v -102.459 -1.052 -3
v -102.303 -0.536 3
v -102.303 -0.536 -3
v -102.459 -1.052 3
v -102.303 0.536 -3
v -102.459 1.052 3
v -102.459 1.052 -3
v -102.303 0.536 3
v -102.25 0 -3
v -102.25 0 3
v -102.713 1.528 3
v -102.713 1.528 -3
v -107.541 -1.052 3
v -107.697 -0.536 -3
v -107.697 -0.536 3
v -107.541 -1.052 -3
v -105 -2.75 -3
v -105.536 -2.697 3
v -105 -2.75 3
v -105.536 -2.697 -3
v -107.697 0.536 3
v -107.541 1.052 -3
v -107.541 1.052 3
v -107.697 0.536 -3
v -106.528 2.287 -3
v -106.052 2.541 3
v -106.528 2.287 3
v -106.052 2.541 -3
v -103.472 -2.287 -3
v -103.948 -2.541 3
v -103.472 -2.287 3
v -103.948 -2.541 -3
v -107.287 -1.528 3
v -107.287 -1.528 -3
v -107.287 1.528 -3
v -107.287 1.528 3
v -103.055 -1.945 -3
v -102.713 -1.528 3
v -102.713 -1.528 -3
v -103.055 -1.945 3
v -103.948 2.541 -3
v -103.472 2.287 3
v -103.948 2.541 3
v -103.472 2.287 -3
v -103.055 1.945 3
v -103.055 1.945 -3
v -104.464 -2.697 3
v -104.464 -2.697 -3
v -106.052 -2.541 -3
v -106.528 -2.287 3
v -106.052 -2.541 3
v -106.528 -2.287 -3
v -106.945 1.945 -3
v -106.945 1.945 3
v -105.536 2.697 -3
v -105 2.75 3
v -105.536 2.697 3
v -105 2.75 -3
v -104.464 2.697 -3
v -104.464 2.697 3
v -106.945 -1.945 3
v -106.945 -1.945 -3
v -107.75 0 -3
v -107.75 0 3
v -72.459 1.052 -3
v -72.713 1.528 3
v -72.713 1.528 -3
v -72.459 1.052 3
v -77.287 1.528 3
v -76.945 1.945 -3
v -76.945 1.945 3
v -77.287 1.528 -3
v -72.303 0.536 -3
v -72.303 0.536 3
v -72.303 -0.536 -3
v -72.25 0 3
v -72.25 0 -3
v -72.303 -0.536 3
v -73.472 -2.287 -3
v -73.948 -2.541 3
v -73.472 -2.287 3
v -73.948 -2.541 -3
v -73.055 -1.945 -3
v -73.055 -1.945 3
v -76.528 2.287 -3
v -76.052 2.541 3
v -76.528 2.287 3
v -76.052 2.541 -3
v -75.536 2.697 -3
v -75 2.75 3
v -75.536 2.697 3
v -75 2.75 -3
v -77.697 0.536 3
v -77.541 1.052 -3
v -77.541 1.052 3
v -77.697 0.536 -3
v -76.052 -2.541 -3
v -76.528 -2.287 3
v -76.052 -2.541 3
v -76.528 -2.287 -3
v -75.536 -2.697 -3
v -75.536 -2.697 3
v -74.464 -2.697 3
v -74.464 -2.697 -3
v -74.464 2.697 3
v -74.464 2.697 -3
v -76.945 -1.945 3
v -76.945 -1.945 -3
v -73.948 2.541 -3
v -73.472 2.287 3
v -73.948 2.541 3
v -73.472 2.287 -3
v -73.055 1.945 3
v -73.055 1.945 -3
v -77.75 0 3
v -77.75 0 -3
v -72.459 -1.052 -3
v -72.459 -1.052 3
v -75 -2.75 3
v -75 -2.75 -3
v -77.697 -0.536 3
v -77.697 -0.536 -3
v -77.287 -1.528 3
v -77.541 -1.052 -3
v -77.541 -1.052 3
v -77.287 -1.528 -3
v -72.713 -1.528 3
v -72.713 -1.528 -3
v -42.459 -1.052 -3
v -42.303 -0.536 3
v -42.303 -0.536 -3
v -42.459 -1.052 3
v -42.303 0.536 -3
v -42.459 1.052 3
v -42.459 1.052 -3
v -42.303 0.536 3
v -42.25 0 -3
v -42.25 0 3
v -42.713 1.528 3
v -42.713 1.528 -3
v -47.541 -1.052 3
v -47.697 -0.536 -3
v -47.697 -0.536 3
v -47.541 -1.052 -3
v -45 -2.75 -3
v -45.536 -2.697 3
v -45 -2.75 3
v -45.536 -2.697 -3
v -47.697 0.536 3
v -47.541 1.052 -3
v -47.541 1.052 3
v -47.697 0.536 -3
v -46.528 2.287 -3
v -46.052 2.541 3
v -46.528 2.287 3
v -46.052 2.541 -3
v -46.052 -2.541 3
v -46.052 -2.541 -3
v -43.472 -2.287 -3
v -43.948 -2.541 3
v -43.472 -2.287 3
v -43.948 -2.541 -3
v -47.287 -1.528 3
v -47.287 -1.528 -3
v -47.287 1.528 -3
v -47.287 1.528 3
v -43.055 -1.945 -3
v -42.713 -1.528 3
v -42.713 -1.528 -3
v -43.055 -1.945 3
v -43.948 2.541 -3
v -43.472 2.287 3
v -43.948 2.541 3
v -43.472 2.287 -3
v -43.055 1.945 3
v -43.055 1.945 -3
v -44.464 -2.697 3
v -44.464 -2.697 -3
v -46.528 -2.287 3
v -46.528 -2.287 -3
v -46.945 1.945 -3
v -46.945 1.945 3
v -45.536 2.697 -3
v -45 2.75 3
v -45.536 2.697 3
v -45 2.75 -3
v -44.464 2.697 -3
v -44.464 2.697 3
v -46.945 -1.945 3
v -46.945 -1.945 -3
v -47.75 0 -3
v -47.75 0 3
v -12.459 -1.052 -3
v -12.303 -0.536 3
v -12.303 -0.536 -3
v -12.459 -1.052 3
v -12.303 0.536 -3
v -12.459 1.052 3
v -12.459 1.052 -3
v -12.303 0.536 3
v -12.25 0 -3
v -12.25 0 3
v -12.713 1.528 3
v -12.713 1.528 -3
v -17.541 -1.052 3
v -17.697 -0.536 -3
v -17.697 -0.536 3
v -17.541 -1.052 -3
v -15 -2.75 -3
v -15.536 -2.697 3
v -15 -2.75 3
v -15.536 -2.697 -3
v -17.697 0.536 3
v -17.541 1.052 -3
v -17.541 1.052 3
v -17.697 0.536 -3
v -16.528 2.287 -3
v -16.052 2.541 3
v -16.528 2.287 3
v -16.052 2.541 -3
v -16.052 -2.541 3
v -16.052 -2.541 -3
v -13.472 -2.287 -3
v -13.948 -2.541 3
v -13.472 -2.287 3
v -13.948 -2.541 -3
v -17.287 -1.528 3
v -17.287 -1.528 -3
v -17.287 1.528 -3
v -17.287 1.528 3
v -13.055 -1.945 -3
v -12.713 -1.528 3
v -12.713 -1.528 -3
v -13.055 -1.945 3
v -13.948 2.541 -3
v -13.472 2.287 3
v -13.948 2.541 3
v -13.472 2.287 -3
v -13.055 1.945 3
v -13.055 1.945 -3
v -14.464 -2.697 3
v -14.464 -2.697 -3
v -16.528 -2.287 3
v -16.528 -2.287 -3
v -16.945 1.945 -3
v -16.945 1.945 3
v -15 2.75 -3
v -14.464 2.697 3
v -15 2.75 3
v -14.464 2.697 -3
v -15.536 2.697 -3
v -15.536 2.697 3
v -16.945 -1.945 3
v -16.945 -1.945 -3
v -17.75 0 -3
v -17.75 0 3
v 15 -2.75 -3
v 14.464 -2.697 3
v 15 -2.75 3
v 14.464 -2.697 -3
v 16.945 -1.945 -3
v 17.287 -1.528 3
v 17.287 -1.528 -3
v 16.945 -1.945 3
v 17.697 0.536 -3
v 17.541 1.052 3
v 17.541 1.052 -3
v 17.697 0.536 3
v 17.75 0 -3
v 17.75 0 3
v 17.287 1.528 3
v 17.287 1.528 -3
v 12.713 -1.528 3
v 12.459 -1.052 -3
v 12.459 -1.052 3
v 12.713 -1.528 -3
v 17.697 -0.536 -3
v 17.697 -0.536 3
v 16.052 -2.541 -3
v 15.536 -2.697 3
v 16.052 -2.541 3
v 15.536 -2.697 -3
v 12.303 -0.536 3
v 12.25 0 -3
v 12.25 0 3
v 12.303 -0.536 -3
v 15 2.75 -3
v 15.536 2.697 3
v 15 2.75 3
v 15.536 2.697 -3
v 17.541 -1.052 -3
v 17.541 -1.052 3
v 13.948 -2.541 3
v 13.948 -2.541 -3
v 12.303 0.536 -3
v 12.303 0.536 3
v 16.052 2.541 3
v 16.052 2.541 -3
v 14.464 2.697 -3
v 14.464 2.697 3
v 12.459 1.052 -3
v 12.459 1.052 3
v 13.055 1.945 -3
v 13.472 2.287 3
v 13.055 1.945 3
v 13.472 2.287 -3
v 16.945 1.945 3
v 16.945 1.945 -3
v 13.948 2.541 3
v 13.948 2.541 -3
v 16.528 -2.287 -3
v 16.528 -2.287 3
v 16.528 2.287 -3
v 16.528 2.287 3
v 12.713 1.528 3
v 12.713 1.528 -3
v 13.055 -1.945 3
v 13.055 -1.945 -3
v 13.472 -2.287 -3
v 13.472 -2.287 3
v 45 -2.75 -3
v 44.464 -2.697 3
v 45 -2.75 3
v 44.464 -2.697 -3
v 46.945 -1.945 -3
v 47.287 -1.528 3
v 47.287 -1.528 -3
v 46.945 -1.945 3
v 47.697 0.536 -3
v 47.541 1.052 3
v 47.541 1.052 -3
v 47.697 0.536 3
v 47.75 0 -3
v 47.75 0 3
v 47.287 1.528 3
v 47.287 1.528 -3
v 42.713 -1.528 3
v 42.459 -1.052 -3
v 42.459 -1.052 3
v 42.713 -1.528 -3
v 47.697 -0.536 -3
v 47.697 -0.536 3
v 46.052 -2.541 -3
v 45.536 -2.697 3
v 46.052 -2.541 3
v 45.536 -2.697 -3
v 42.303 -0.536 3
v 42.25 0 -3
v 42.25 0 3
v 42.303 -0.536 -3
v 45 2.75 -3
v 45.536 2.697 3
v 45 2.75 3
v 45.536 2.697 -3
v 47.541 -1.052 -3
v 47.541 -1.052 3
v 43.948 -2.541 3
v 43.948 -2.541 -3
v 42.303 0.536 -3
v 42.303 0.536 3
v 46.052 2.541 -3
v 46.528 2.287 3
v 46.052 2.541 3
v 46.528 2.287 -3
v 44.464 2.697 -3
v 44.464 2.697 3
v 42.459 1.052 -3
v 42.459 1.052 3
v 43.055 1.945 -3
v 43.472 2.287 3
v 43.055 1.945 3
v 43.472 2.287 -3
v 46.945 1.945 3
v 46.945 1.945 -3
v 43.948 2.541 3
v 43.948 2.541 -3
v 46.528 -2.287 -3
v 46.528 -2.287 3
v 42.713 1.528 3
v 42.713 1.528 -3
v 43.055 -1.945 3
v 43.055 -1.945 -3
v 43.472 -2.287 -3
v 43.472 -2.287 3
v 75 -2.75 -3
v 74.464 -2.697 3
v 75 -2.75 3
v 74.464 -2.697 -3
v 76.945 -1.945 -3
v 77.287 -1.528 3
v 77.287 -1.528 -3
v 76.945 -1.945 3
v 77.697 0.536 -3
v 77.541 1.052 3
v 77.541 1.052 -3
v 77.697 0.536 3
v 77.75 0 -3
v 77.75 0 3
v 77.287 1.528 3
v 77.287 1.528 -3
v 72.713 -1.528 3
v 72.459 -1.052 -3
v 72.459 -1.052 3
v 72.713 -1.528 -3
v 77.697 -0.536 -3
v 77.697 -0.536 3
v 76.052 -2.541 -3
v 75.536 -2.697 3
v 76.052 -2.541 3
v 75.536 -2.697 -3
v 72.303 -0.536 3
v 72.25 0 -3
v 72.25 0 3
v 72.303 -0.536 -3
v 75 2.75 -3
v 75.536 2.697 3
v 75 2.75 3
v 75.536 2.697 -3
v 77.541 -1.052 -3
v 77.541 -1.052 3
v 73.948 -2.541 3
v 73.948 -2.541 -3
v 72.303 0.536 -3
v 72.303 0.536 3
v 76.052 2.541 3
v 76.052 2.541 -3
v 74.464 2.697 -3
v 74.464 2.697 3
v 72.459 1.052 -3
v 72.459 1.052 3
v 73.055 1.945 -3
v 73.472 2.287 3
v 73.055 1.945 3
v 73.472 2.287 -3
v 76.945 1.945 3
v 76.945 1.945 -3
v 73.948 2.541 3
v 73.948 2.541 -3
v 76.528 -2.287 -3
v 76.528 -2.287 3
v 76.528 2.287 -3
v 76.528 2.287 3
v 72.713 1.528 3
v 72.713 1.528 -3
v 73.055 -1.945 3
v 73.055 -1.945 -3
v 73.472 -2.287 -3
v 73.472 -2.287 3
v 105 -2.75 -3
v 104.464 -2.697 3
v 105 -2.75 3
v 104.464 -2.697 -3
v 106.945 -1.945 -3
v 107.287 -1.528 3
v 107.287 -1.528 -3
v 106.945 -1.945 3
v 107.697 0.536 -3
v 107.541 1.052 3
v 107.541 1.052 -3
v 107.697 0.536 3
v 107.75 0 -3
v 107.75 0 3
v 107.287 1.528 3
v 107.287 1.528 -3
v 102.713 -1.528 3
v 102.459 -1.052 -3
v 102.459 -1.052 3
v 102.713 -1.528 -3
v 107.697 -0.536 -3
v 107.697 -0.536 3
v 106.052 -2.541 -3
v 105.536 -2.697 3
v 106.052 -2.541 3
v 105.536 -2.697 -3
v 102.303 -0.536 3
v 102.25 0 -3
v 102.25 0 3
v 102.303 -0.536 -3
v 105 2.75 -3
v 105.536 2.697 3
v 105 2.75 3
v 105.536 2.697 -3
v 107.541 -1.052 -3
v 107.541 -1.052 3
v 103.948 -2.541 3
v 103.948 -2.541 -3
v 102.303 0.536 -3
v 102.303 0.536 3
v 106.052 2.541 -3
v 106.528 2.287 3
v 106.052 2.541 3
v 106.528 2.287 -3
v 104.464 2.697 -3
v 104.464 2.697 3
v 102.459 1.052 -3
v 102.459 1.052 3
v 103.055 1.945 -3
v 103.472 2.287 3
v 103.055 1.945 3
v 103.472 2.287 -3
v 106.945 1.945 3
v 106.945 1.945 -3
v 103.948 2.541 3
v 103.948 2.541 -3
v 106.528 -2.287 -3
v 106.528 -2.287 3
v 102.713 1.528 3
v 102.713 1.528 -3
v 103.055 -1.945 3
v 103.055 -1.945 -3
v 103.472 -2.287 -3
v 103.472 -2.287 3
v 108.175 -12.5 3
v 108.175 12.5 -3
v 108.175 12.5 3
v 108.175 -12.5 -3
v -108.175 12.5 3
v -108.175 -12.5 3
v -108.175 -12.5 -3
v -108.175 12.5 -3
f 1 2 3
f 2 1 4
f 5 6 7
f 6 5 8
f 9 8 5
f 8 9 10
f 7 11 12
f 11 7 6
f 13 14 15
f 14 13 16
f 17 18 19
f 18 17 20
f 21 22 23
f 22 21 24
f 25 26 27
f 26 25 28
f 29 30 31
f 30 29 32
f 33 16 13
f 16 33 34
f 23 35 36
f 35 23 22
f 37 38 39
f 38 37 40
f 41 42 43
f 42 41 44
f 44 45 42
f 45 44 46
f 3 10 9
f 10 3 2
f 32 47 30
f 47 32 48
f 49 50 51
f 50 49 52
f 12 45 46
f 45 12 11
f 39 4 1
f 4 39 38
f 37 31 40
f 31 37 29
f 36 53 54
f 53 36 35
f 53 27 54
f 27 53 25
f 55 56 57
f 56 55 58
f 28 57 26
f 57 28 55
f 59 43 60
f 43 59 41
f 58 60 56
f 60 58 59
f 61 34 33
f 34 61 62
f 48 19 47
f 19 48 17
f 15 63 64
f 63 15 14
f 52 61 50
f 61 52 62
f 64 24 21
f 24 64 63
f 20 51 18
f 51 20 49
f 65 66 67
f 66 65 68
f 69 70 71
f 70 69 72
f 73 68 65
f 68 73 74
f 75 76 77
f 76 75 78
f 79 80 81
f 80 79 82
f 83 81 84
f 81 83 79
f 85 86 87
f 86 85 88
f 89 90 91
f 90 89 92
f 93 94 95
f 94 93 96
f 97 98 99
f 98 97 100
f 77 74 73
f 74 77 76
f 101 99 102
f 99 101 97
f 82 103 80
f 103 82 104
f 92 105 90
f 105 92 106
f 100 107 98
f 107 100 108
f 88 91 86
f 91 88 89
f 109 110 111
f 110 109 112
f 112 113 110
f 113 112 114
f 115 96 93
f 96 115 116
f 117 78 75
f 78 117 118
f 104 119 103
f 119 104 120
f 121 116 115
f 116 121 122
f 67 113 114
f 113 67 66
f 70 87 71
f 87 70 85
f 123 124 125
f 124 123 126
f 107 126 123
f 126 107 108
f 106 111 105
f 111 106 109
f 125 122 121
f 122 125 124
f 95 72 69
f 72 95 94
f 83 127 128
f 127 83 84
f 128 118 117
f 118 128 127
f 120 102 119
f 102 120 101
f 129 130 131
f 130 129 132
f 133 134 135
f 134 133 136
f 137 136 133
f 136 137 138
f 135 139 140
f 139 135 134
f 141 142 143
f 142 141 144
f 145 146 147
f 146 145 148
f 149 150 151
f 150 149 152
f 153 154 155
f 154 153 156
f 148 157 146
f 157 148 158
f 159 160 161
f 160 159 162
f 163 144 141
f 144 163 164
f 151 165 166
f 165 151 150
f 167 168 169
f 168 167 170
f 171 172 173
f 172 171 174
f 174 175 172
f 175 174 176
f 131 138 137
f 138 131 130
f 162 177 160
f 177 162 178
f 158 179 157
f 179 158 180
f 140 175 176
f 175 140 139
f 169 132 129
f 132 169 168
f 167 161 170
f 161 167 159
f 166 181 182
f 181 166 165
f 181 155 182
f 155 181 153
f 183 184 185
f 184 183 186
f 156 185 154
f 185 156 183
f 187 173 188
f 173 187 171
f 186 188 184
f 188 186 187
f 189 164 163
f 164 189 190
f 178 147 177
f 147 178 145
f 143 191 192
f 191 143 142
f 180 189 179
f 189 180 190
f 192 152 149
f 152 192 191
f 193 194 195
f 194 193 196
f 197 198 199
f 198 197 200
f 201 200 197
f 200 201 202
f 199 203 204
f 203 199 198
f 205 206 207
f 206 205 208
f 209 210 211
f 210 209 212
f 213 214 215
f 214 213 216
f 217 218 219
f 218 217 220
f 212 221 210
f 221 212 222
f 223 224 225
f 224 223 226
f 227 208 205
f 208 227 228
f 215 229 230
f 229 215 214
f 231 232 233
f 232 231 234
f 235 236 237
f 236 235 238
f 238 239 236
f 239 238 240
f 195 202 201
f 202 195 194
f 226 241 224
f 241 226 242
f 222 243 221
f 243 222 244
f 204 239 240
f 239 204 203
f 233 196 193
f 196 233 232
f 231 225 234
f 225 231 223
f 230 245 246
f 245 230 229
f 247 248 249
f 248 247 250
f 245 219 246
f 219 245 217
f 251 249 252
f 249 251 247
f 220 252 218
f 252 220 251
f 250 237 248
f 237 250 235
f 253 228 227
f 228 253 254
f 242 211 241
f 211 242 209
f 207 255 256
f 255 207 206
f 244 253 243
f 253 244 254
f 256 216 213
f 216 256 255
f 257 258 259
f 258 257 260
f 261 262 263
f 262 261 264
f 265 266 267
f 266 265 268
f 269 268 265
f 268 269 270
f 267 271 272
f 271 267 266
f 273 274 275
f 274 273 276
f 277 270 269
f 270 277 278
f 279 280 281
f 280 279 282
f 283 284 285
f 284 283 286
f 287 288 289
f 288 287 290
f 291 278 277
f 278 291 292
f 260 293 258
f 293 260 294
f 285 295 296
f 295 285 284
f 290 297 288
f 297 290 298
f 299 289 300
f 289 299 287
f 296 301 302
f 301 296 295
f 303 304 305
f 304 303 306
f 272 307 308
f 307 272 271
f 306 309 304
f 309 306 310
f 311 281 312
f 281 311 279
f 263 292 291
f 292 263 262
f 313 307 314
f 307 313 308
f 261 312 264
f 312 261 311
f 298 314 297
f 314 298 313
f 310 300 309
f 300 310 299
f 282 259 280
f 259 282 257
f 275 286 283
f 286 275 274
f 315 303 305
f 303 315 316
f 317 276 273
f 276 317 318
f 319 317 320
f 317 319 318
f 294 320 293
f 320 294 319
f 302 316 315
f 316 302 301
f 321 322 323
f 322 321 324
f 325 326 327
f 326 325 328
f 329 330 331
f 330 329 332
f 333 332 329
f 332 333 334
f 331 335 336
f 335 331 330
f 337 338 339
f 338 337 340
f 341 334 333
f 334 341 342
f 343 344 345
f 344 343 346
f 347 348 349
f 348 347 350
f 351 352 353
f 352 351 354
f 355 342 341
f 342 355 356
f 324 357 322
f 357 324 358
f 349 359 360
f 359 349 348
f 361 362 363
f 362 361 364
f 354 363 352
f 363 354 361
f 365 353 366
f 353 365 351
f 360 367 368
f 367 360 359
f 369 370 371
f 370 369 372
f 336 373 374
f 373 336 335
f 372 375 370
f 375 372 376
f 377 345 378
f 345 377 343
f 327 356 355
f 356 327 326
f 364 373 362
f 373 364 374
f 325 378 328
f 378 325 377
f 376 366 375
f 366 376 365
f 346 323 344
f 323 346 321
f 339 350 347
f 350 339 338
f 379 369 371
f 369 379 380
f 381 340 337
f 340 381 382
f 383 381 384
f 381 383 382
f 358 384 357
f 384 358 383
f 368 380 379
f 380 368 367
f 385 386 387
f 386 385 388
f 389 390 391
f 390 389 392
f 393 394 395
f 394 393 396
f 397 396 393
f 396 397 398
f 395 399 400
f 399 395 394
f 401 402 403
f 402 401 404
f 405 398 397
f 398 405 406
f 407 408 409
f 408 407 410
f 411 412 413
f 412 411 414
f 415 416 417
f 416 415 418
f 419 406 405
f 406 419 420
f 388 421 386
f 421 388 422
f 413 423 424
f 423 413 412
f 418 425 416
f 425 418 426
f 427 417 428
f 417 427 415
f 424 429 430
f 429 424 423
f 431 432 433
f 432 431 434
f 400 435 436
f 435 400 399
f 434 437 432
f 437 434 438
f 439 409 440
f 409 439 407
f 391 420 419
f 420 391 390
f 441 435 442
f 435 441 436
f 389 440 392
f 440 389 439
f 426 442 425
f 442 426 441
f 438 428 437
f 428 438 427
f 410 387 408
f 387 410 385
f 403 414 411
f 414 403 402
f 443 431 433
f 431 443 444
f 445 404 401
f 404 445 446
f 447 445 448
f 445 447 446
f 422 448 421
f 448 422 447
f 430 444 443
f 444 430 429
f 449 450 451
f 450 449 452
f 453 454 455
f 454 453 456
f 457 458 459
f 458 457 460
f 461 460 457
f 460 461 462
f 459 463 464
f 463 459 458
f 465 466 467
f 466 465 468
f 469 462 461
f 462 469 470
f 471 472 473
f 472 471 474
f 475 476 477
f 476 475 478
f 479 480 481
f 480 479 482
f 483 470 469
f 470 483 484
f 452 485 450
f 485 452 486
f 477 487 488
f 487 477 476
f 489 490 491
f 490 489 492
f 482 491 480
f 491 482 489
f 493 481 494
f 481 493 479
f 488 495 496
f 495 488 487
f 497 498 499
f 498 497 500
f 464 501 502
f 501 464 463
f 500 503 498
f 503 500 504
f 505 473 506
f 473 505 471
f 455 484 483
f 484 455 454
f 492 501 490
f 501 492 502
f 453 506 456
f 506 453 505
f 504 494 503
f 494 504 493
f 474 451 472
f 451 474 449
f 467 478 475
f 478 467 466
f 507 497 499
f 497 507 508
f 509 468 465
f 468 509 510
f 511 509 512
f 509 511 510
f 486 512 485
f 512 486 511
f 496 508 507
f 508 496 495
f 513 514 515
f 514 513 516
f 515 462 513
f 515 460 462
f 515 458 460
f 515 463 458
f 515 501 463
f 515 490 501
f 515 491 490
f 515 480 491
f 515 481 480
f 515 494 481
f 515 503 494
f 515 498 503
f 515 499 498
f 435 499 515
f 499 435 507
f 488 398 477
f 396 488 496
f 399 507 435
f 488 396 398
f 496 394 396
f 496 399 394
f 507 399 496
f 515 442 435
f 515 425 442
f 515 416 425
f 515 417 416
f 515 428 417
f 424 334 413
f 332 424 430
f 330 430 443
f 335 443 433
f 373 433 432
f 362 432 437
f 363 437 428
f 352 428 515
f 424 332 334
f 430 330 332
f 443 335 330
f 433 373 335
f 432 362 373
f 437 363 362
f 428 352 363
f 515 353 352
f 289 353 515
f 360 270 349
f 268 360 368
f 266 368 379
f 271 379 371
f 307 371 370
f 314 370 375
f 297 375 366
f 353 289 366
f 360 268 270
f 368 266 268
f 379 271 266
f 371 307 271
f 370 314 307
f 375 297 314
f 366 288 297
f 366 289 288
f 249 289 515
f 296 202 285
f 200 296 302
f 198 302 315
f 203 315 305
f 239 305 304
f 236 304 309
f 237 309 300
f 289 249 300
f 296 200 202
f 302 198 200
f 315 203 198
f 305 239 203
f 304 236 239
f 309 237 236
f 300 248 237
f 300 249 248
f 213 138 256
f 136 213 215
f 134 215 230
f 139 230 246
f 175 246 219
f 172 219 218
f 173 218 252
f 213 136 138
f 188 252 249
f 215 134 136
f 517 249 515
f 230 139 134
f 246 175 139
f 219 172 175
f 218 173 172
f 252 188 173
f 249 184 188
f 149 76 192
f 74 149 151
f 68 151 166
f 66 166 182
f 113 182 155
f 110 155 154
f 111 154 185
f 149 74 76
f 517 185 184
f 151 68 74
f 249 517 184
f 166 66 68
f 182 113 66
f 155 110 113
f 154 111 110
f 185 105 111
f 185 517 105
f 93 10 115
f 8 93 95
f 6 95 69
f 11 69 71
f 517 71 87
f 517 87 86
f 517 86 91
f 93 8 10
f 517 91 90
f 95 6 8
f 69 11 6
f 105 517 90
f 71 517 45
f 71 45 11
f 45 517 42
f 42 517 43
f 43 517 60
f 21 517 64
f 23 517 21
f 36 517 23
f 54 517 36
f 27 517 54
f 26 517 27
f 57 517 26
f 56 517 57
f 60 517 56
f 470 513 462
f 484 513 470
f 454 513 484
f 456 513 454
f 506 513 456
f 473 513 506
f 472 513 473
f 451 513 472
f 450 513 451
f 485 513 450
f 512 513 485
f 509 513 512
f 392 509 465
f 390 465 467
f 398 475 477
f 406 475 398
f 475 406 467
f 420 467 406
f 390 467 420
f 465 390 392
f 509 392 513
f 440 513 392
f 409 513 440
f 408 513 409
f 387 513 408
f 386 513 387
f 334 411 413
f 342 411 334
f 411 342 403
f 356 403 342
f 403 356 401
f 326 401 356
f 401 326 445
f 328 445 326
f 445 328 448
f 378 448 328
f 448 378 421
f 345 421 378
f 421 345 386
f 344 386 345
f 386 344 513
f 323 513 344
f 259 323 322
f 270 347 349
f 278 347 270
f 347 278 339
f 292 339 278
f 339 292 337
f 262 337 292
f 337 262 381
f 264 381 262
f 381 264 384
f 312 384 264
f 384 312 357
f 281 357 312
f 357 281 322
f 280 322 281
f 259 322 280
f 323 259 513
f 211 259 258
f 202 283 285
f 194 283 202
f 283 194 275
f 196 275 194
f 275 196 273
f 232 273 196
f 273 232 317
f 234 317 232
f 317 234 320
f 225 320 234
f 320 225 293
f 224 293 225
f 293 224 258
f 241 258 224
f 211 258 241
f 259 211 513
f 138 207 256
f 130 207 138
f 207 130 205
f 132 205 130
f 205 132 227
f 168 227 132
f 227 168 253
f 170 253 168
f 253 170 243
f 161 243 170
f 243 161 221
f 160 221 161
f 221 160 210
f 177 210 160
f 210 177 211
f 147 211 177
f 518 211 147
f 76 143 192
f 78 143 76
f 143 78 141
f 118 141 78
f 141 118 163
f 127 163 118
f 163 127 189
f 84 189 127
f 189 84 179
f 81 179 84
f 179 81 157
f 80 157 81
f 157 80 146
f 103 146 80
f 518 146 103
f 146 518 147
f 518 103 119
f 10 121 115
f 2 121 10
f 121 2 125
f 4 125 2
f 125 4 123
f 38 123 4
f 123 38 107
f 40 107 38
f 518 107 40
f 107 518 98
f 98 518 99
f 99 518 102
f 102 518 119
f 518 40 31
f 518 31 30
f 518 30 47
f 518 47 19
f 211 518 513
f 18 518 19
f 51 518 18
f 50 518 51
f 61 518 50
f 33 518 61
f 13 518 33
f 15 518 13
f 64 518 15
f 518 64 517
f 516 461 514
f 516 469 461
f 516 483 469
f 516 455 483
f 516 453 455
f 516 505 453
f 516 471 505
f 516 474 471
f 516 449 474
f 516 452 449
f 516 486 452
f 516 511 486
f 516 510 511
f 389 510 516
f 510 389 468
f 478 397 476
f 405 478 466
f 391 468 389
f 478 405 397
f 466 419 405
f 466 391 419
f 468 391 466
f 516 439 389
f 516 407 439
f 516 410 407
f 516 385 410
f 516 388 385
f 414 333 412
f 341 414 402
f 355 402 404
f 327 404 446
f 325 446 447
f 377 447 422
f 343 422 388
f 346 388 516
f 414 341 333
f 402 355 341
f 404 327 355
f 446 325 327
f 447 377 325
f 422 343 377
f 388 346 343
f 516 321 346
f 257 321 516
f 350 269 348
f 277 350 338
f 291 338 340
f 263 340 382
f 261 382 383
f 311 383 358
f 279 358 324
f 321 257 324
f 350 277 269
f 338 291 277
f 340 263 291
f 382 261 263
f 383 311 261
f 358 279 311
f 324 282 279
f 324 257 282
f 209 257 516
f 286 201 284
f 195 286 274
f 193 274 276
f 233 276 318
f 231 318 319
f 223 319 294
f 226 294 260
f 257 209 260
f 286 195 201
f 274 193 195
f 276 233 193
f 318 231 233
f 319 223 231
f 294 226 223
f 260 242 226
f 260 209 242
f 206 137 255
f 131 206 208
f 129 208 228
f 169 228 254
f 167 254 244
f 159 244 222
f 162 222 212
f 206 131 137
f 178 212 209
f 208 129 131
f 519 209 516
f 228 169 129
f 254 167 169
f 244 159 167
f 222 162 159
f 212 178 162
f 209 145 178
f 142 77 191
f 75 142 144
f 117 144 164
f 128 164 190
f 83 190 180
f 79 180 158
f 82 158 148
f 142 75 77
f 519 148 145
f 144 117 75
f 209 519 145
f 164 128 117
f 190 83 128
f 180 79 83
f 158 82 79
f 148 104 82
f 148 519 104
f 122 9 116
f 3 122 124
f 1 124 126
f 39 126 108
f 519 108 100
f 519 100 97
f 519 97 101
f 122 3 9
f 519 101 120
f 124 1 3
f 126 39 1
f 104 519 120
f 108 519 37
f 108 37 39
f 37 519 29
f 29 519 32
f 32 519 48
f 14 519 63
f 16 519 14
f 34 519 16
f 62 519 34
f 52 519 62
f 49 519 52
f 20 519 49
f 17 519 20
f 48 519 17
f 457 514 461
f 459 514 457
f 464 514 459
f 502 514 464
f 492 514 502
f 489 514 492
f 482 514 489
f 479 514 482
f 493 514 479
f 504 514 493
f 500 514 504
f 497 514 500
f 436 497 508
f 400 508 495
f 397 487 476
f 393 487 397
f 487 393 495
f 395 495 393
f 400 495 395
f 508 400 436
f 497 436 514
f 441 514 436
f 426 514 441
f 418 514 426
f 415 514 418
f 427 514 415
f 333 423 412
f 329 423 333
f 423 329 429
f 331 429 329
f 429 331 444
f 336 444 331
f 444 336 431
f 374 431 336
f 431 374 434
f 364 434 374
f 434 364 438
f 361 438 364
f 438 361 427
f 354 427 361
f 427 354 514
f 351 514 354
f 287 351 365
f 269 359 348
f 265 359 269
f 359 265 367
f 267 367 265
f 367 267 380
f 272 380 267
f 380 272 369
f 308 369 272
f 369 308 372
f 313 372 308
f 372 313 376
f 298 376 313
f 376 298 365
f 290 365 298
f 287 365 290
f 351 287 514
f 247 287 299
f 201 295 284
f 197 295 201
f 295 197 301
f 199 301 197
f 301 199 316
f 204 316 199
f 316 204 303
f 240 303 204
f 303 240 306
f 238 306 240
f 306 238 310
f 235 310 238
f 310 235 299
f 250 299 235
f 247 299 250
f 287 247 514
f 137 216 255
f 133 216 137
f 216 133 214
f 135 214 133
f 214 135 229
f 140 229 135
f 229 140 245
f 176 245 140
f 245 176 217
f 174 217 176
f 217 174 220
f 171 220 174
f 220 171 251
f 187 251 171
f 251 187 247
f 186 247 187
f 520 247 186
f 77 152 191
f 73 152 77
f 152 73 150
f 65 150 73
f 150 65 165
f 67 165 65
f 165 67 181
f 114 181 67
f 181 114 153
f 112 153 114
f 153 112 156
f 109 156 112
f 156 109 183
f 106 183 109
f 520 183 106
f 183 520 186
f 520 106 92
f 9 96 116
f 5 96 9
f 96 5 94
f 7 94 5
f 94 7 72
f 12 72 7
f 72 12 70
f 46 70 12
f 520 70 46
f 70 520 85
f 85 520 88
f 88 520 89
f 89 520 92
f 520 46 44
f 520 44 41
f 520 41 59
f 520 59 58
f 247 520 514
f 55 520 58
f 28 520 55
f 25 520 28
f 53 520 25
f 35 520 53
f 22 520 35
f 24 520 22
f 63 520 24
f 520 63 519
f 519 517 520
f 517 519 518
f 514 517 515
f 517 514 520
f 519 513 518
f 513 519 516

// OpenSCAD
$fn = 32;

// ----------------------------------------------------------------------
// Hole bar, 8 x Ø5.5
// row layout, 3.175 mm edge offset
// ----------------------------------------------------------------------

// --- parameters (mm) ---
bar_w = 25;    // bar width (Y)
bar_t = 6;     // bar thickness (Z)
holes = 8;     // holes per row
hole_d = 5.5;  // hole diameter
edge = 3.175;  // offset from the bar end to the first hole
pitch = 30;    // pitch between neighbouring holes

// --- derived feature positions (mm) ---
span = (holes - 1) * pitch;   // = 210   distance between the end holes
bar_l = span + 2 * edge;      // = 216.35   overall bar length
start_x = -bar_l / 2 + edge;  // = -105   X of the first hole
feature_centers = [
  [start_x + 0 * pitch, 0],
  [start_x + 1 * pitch, 0],
  [start_x + 2 * pitch, 0],
  [start_x + 3 * pitch, 0],
  [start_x + 4 * pitch, 0],
  [start_x + 5 * pitch, 0],
  [start_x + 6 * pitch, 0],
  [start_x + 7 * pitch, 0]
];   // hole centres of the first row

// bar with one row of holes, drilled from feature_centers
difference() {
  translate([-bar_l / 2, -bar_w / 2, -bar_t / 2]) cube([bar_l, bar_w, bar_t]);
  for (centre = feature_centers)
    translate([centre[0], centre[1], 0])
      cylinder(d = hole_d, h = bar_t + 2, center = true);
}
